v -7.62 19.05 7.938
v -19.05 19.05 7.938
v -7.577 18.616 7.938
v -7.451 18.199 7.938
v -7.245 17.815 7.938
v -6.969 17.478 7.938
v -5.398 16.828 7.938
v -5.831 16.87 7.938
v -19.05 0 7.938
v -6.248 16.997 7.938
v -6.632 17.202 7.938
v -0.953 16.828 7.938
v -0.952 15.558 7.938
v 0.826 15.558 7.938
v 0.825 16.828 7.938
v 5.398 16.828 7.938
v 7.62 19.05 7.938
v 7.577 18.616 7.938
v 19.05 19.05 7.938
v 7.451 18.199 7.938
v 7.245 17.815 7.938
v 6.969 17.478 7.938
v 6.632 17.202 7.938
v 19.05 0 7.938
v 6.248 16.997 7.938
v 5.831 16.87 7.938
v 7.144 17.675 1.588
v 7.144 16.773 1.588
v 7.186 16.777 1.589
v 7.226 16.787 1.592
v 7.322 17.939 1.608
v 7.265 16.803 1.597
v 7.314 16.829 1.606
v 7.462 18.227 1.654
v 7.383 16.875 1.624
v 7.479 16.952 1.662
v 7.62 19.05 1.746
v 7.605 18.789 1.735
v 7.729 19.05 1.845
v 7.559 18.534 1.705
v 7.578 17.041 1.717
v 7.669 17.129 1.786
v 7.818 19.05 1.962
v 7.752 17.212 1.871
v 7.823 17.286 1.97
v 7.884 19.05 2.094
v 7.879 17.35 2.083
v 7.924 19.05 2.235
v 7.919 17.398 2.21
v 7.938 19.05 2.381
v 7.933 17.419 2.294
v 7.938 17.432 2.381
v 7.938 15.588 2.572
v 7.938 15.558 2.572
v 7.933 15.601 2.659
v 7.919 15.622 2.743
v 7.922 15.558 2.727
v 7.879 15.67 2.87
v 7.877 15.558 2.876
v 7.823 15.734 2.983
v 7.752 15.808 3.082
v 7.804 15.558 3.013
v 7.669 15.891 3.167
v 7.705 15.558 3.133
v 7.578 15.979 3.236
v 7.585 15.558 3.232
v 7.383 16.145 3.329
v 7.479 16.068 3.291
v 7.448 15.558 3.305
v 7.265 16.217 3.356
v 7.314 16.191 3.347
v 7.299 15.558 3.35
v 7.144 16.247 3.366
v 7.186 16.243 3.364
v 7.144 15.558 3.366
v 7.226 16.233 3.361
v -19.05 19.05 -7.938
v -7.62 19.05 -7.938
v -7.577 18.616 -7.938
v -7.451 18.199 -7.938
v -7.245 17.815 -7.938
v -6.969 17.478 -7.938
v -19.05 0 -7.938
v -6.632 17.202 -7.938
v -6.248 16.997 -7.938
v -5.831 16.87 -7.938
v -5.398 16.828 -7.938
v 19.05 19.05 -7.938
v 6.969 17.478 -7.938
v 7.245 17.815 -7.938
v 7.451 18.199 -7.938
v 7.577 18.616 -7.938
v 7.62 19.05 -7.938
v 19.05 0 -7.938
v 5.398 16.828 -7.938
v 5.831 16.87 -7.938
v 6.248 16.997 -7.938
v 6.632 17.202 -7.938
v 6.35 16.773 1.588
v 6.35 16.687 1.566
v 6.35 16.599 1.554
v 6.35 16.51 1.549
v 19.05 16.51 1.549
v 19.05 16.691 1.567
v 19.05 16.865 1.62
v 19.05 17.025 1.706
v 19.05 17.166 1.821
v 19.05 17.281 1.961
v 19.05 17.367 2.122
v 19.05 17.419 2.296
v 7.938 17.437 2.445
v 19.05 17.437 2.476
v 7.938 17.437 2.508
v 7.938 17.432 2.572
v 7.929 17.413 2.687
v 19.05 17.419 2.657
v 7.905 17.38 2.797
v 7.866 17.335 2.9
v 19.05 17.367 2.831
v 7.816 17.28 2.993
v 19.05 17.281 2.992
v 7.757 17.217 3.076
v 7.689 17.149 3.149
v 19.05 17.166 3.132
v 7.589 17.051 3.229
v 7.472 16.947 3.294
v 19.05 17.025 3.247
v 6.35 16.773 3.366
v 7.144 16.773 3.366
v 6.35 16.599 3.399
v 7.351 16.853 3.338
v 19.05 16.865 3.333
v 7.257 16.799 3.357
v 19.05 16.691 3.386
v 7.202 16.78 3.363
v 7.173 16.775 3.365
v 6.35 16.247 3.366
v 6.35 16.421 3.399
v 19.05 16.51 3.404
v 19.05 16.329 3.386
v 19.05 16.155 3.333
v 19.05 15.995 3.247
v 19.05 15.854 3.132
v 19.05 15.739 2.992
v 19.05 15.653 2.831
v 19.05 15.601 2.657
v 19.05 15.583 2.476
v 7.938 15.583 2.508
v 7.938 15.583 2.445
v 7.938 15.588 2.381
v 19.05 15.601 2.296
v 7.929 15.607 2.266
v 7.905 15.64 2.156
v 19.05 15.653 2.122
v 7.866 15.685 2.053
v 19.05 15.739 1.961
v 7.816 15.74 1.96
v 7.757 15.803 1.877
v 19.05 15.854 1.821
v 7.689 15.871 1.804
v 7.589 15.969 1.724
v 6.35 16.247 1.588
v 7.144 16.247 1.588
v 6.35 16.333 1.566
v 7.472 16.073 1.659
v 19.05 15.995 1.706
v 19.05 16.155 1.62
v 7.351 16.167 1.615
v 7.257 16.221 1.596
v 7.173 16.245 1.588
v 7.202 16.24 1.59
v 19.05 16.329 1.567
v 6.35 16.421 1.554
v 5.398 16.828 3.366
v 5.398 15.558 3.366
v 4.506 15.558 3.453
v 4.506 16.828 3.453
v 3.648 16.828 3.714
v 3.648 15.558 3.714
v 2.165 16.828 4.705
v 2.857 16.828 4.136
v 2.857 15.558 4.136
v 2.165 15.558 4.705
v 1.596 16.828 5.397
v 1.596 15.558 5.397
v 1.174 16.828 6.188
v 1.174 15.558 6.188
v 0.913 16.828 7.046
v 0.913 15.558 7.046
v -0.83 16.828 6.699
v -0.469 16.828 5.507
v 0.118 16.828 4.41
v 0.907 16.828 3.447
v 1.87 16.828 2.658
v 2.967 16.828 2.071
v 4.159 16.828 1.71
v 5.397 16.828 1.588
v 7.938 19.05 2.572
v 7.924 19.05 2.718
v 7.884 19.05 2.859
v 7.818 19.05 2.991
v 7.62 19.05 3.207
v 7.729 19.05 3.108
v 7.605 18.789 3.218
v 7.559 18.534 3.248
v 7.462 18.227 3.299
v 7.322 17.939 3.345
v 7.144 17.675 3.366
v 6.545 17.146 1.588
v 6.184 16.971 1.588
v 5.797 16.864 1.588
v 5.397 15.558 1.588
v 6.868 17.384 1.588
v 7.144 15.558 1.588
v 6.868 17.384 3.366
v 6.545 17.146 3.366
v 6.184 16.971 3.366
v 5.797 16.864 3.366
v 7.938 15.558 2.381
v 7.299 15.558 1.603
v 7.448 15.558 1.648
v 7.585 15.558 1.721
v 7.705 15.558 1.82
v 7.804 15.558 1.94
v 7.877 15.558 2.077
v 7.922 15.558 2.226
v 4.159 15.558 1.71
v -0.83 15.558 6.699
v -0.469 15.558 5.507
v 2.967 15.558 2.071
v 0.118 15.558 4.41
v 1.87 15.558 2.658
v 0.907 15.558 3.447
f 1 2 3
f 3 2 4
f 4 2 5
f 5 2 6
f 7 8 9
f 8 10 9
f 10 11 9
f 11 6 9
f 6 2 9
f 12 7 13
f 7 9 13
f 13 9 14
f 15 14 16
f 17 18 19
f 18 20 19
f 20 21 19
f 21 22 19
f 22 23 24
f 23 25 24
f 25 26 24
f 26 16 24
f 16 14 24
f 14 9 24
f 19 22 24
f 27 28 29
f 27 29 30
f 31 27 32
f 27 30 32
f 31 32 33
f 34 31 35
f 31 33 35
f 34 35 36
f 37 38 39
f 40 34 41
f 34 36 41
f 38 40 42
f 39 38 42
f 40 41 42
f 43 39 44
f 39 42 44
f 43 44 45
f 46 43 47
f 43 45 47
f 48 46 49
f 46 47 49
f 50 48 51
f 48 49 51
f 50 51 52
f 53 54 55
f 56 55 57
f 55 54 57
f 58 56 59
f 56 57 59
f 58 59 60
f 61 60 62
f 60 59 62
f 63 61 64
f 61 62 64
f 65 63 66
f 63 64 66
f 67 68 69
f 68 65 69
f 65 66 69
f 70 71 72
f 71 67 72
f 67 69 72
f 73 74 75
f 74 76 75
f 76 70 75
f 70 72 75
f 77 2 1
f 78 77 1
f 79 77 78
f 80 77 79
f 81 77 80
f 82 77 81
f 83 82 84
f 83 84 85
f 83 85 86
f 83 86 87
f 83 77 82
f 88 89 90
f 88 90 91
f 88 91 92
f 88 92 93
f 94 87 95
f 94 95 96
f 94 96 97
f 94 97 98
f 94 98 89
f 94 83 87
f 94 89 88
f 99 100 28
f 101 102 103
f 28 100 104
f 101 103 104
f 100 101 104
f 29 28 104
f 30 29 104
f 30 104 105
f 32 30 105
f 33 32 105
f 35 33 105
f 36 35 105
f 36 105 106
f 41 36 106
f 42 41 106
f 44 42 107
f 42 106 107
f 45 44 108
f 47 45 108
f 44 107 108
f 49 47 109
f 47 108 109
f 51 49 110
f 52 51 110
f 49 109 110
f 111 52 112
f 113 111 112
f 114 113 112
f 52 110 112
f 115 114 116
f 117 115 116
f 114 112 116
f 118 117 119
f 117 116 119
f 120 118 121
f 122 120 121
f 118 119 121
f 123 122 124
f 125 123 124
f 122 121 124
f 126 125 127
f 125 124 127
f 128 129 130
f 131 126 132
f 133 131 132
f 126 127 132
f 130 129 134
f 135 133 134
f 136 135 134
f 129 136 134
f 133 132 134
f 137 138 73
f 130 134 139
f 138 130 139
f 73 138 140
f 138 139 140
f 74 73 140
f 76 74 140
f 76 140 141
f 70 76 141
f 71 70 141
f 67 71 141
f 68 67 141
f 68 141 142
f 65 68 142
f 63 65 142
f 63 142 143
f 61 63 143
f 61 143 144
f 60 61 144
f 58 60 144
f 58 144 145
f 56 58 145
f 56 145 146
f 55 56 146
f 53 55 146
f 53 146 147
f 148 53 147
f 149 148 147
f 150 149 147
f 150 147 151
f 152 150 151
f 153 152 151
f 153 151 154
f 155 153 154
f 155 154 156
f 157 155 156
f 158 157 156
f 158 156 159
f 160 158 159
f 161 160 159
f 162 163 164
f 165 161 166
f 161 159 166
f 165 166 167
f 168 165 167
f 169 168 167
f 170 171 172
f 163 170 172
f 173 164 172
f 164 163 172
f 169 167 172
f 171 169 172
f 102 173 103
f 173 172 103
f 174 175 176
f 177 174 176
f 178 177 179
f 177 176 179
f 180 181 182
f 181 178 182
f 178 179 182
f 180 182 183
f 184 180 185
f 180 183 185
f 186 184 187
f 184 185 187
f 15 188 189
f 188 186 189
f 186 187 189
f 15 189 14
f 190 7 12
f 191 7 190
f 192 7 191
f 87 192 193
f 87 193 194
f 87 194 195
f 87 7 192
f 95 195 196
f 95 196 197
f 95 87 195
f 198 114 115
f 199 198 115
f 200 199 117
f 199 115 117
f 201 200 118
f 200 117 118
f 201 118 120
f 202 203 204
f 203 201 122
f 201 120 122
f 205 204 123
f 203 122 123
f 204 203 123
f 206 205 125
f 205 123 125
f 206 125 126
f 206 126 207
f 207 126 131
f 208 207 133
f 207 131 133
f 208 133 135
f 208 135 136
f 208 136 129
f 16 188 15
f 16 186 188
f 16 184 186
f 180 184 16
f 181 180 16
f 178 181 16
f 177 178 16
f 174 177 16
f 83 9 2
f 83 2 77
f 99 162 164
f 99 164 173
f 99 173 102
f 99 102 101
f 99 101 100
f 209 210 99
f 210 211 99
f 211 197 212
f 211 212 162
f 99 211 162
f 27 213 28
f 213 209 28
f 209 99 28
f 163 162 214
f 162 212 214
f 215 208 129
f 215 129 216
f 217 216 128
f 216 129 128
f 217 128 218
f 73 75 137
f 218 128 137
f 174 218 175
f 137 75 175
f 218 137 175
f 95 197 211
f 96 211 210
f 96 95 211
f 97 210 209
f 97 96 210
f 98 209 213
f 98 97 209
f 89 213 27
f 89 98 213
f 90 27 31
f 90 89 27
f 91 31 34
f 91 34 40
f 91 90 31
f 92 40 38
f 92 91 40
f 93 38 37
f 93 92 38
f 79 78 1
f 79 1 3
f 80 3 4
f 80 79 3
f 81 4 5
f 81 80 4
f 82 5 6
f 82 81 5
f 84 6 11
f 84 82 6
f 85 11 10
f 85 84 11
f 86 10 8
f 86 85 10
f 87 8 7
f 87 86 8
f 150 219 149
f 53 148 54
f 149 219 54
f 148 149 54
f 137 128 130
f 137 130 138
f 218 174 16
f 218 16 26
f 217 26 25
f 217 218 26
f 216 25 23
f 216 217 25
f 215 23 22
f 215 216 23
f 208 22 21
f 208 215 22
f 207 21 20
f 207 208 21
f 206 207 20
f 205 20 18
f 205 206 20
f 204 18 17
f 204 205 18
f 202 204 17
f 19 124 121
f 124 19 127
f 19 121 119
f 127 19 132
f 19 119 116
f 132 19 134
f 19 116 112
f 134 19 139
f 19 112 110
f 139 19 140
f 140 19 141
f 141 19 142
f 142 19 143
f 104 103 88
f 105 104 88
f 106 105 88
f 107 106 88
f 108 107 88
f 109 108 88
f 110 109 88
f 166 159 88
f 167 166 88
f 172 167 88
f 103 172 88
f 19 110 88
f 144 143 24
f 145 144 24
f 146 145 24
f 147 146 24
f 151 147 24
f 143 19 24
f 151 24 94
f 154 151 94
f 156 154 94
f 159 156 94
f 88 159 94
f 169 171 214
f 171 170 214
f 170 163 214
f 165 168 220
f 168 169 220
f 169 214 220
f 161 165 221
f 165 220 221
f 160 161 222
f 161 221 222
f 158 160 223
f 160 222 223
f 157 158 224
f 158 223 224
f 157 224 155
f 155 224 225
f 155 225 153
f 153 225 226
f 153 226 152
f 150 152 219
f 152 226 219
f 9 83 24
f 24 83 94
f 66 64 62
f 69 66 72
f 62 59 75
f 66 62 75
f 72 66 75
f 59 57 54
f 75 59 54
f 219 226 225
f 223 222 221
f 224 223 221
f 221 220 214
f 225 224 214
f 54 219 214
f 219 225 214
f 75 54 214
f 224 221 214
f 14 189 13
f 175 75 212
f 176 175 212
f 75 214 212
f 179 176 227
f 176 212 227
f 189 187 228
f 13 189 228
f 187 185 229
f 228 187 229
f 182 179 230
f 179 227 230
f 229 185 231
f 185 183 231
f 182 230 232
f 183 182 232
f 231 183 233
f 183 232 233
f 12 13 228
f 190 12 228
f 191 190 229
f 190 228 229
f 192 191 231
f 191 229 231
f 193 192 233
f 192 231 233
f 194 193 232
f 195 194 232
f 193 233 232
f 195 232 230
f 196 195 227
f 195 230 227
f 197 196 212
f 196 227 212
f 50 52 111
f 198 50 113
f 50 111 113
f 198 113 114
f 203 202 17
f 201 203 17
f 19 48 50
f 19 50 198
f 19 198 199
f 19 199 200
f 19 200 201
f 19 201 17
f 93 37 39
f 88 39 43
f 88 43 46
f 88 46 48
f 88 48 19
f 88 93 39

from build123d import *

# Parameters (mm, degrees)
SKETCH1_W               = 38.1
SKETCH1_H               = 15.875
BOSS_EXTRUDE1_DEPTH     = 19.05
CUT_EXTRUDE1_DEPTH      = 25.4
CUT_EXTRUDE2_DEPTH      = 27.62839016
CUT_EXTRUDE2_DEPTH_BACK = 1.27
SKETCH5_R               = 0.9271
CUT_EXTRUDE3_DEPTH      = 12.7


with BuildPart() as part:
    # Sketch1 → Boss-Extrude1 (new body)
    with BuildSketch(Plane(origin=(0, 0, 0), x_dir=(1, 0, 0), z_dir=(0, 1, 0))):
        Rectangle(SKETCH1_W, SKETCH1_H)
    extrude(amount=BOSS_EXTRUDE1_DEPTH)

    # Sketch2 → Cut-Extrude1 (cut)
    with BuildSketch(Plane(origin=(0, 0, -7.9375), x_dir=(-1, 0, 0), z_dir=(0, 0, -1))):
        with BuildLine():
            Line((5.3975, 16.8275), (-5.3975, 16.8275))
            ThreePointArc((-5.3975, 16.8275), (-7.62, 19.05), (-5.3975, 21.2725))
            Line((-5.3975, 21.2725), (5.3975, 21.2725))
            ThreePointArc((5.3975, 21.2725), (7.62, 19.05), (5.3975, 16.8275))
        make_face()
    extrude(amount=-CUT_EXTRUDE1_DEPTH, mode=Mode.SUBTRACT)

    # Sketch4 → Cut-Extrude2 (cut, two sides: drawn at the far end of the back side and taken through both)
    with BuildSketch(Plane(origin=(0, 16.8275, 0), x_dir=(1, 0, 0), z_dir=(0, 1, 0)).offset(-CUT_EXTRUDE2_DEPTH_BACK)):
        with BuildLine():
            Line((0.8255, -7.9375), (-0.9525, -7.9375))
            ThreePointArc((-0.9525, -7.9375), (0.907371939, -3.447371939), (5.3975, -1.5875))
            Line((5.3975, -1.5875), (7.14375, -1.5875))
            ThreePointArc((7.14375, -1.5875), (7.705016008, -1.819983992), (7.9375, -2.38125))
            Line((7.9375, -2.38125), (7.9375, -2.57175))
            ThreePointArc((7.9375, -2.57175), (7.705016008, -3.133016008), (7.14375, -3.3655))
            Line((7.14375, -3.3655), (5.3975, -3.3655))
            ThreePointArc((5.3975, -3.3655), (2.164607796, -4.704607796), (0.8255, -7.9375))
        make_face()
    extrude(amount=CUT_EXTRUDE2_DEPTH + CUT_EXTRUDE2_DEPTH_BACK, mode=Mode.SUBTRACT)

    # Sketch5 → Cut-Extrude3 (cut)
    with BuildSketch(Plane(origin=(19.05, 0, 0), x_dir=(0, 0, -1), z_dir=(1, 0, 0))):
        with Locations((-2.4765, 16.51)):
            Circle(SKETCH5_R)
    extrude(amount=-CUT_EXTRUDE3_DEPTH, mode=Mode.SUBTRACT)


solid = part.part
